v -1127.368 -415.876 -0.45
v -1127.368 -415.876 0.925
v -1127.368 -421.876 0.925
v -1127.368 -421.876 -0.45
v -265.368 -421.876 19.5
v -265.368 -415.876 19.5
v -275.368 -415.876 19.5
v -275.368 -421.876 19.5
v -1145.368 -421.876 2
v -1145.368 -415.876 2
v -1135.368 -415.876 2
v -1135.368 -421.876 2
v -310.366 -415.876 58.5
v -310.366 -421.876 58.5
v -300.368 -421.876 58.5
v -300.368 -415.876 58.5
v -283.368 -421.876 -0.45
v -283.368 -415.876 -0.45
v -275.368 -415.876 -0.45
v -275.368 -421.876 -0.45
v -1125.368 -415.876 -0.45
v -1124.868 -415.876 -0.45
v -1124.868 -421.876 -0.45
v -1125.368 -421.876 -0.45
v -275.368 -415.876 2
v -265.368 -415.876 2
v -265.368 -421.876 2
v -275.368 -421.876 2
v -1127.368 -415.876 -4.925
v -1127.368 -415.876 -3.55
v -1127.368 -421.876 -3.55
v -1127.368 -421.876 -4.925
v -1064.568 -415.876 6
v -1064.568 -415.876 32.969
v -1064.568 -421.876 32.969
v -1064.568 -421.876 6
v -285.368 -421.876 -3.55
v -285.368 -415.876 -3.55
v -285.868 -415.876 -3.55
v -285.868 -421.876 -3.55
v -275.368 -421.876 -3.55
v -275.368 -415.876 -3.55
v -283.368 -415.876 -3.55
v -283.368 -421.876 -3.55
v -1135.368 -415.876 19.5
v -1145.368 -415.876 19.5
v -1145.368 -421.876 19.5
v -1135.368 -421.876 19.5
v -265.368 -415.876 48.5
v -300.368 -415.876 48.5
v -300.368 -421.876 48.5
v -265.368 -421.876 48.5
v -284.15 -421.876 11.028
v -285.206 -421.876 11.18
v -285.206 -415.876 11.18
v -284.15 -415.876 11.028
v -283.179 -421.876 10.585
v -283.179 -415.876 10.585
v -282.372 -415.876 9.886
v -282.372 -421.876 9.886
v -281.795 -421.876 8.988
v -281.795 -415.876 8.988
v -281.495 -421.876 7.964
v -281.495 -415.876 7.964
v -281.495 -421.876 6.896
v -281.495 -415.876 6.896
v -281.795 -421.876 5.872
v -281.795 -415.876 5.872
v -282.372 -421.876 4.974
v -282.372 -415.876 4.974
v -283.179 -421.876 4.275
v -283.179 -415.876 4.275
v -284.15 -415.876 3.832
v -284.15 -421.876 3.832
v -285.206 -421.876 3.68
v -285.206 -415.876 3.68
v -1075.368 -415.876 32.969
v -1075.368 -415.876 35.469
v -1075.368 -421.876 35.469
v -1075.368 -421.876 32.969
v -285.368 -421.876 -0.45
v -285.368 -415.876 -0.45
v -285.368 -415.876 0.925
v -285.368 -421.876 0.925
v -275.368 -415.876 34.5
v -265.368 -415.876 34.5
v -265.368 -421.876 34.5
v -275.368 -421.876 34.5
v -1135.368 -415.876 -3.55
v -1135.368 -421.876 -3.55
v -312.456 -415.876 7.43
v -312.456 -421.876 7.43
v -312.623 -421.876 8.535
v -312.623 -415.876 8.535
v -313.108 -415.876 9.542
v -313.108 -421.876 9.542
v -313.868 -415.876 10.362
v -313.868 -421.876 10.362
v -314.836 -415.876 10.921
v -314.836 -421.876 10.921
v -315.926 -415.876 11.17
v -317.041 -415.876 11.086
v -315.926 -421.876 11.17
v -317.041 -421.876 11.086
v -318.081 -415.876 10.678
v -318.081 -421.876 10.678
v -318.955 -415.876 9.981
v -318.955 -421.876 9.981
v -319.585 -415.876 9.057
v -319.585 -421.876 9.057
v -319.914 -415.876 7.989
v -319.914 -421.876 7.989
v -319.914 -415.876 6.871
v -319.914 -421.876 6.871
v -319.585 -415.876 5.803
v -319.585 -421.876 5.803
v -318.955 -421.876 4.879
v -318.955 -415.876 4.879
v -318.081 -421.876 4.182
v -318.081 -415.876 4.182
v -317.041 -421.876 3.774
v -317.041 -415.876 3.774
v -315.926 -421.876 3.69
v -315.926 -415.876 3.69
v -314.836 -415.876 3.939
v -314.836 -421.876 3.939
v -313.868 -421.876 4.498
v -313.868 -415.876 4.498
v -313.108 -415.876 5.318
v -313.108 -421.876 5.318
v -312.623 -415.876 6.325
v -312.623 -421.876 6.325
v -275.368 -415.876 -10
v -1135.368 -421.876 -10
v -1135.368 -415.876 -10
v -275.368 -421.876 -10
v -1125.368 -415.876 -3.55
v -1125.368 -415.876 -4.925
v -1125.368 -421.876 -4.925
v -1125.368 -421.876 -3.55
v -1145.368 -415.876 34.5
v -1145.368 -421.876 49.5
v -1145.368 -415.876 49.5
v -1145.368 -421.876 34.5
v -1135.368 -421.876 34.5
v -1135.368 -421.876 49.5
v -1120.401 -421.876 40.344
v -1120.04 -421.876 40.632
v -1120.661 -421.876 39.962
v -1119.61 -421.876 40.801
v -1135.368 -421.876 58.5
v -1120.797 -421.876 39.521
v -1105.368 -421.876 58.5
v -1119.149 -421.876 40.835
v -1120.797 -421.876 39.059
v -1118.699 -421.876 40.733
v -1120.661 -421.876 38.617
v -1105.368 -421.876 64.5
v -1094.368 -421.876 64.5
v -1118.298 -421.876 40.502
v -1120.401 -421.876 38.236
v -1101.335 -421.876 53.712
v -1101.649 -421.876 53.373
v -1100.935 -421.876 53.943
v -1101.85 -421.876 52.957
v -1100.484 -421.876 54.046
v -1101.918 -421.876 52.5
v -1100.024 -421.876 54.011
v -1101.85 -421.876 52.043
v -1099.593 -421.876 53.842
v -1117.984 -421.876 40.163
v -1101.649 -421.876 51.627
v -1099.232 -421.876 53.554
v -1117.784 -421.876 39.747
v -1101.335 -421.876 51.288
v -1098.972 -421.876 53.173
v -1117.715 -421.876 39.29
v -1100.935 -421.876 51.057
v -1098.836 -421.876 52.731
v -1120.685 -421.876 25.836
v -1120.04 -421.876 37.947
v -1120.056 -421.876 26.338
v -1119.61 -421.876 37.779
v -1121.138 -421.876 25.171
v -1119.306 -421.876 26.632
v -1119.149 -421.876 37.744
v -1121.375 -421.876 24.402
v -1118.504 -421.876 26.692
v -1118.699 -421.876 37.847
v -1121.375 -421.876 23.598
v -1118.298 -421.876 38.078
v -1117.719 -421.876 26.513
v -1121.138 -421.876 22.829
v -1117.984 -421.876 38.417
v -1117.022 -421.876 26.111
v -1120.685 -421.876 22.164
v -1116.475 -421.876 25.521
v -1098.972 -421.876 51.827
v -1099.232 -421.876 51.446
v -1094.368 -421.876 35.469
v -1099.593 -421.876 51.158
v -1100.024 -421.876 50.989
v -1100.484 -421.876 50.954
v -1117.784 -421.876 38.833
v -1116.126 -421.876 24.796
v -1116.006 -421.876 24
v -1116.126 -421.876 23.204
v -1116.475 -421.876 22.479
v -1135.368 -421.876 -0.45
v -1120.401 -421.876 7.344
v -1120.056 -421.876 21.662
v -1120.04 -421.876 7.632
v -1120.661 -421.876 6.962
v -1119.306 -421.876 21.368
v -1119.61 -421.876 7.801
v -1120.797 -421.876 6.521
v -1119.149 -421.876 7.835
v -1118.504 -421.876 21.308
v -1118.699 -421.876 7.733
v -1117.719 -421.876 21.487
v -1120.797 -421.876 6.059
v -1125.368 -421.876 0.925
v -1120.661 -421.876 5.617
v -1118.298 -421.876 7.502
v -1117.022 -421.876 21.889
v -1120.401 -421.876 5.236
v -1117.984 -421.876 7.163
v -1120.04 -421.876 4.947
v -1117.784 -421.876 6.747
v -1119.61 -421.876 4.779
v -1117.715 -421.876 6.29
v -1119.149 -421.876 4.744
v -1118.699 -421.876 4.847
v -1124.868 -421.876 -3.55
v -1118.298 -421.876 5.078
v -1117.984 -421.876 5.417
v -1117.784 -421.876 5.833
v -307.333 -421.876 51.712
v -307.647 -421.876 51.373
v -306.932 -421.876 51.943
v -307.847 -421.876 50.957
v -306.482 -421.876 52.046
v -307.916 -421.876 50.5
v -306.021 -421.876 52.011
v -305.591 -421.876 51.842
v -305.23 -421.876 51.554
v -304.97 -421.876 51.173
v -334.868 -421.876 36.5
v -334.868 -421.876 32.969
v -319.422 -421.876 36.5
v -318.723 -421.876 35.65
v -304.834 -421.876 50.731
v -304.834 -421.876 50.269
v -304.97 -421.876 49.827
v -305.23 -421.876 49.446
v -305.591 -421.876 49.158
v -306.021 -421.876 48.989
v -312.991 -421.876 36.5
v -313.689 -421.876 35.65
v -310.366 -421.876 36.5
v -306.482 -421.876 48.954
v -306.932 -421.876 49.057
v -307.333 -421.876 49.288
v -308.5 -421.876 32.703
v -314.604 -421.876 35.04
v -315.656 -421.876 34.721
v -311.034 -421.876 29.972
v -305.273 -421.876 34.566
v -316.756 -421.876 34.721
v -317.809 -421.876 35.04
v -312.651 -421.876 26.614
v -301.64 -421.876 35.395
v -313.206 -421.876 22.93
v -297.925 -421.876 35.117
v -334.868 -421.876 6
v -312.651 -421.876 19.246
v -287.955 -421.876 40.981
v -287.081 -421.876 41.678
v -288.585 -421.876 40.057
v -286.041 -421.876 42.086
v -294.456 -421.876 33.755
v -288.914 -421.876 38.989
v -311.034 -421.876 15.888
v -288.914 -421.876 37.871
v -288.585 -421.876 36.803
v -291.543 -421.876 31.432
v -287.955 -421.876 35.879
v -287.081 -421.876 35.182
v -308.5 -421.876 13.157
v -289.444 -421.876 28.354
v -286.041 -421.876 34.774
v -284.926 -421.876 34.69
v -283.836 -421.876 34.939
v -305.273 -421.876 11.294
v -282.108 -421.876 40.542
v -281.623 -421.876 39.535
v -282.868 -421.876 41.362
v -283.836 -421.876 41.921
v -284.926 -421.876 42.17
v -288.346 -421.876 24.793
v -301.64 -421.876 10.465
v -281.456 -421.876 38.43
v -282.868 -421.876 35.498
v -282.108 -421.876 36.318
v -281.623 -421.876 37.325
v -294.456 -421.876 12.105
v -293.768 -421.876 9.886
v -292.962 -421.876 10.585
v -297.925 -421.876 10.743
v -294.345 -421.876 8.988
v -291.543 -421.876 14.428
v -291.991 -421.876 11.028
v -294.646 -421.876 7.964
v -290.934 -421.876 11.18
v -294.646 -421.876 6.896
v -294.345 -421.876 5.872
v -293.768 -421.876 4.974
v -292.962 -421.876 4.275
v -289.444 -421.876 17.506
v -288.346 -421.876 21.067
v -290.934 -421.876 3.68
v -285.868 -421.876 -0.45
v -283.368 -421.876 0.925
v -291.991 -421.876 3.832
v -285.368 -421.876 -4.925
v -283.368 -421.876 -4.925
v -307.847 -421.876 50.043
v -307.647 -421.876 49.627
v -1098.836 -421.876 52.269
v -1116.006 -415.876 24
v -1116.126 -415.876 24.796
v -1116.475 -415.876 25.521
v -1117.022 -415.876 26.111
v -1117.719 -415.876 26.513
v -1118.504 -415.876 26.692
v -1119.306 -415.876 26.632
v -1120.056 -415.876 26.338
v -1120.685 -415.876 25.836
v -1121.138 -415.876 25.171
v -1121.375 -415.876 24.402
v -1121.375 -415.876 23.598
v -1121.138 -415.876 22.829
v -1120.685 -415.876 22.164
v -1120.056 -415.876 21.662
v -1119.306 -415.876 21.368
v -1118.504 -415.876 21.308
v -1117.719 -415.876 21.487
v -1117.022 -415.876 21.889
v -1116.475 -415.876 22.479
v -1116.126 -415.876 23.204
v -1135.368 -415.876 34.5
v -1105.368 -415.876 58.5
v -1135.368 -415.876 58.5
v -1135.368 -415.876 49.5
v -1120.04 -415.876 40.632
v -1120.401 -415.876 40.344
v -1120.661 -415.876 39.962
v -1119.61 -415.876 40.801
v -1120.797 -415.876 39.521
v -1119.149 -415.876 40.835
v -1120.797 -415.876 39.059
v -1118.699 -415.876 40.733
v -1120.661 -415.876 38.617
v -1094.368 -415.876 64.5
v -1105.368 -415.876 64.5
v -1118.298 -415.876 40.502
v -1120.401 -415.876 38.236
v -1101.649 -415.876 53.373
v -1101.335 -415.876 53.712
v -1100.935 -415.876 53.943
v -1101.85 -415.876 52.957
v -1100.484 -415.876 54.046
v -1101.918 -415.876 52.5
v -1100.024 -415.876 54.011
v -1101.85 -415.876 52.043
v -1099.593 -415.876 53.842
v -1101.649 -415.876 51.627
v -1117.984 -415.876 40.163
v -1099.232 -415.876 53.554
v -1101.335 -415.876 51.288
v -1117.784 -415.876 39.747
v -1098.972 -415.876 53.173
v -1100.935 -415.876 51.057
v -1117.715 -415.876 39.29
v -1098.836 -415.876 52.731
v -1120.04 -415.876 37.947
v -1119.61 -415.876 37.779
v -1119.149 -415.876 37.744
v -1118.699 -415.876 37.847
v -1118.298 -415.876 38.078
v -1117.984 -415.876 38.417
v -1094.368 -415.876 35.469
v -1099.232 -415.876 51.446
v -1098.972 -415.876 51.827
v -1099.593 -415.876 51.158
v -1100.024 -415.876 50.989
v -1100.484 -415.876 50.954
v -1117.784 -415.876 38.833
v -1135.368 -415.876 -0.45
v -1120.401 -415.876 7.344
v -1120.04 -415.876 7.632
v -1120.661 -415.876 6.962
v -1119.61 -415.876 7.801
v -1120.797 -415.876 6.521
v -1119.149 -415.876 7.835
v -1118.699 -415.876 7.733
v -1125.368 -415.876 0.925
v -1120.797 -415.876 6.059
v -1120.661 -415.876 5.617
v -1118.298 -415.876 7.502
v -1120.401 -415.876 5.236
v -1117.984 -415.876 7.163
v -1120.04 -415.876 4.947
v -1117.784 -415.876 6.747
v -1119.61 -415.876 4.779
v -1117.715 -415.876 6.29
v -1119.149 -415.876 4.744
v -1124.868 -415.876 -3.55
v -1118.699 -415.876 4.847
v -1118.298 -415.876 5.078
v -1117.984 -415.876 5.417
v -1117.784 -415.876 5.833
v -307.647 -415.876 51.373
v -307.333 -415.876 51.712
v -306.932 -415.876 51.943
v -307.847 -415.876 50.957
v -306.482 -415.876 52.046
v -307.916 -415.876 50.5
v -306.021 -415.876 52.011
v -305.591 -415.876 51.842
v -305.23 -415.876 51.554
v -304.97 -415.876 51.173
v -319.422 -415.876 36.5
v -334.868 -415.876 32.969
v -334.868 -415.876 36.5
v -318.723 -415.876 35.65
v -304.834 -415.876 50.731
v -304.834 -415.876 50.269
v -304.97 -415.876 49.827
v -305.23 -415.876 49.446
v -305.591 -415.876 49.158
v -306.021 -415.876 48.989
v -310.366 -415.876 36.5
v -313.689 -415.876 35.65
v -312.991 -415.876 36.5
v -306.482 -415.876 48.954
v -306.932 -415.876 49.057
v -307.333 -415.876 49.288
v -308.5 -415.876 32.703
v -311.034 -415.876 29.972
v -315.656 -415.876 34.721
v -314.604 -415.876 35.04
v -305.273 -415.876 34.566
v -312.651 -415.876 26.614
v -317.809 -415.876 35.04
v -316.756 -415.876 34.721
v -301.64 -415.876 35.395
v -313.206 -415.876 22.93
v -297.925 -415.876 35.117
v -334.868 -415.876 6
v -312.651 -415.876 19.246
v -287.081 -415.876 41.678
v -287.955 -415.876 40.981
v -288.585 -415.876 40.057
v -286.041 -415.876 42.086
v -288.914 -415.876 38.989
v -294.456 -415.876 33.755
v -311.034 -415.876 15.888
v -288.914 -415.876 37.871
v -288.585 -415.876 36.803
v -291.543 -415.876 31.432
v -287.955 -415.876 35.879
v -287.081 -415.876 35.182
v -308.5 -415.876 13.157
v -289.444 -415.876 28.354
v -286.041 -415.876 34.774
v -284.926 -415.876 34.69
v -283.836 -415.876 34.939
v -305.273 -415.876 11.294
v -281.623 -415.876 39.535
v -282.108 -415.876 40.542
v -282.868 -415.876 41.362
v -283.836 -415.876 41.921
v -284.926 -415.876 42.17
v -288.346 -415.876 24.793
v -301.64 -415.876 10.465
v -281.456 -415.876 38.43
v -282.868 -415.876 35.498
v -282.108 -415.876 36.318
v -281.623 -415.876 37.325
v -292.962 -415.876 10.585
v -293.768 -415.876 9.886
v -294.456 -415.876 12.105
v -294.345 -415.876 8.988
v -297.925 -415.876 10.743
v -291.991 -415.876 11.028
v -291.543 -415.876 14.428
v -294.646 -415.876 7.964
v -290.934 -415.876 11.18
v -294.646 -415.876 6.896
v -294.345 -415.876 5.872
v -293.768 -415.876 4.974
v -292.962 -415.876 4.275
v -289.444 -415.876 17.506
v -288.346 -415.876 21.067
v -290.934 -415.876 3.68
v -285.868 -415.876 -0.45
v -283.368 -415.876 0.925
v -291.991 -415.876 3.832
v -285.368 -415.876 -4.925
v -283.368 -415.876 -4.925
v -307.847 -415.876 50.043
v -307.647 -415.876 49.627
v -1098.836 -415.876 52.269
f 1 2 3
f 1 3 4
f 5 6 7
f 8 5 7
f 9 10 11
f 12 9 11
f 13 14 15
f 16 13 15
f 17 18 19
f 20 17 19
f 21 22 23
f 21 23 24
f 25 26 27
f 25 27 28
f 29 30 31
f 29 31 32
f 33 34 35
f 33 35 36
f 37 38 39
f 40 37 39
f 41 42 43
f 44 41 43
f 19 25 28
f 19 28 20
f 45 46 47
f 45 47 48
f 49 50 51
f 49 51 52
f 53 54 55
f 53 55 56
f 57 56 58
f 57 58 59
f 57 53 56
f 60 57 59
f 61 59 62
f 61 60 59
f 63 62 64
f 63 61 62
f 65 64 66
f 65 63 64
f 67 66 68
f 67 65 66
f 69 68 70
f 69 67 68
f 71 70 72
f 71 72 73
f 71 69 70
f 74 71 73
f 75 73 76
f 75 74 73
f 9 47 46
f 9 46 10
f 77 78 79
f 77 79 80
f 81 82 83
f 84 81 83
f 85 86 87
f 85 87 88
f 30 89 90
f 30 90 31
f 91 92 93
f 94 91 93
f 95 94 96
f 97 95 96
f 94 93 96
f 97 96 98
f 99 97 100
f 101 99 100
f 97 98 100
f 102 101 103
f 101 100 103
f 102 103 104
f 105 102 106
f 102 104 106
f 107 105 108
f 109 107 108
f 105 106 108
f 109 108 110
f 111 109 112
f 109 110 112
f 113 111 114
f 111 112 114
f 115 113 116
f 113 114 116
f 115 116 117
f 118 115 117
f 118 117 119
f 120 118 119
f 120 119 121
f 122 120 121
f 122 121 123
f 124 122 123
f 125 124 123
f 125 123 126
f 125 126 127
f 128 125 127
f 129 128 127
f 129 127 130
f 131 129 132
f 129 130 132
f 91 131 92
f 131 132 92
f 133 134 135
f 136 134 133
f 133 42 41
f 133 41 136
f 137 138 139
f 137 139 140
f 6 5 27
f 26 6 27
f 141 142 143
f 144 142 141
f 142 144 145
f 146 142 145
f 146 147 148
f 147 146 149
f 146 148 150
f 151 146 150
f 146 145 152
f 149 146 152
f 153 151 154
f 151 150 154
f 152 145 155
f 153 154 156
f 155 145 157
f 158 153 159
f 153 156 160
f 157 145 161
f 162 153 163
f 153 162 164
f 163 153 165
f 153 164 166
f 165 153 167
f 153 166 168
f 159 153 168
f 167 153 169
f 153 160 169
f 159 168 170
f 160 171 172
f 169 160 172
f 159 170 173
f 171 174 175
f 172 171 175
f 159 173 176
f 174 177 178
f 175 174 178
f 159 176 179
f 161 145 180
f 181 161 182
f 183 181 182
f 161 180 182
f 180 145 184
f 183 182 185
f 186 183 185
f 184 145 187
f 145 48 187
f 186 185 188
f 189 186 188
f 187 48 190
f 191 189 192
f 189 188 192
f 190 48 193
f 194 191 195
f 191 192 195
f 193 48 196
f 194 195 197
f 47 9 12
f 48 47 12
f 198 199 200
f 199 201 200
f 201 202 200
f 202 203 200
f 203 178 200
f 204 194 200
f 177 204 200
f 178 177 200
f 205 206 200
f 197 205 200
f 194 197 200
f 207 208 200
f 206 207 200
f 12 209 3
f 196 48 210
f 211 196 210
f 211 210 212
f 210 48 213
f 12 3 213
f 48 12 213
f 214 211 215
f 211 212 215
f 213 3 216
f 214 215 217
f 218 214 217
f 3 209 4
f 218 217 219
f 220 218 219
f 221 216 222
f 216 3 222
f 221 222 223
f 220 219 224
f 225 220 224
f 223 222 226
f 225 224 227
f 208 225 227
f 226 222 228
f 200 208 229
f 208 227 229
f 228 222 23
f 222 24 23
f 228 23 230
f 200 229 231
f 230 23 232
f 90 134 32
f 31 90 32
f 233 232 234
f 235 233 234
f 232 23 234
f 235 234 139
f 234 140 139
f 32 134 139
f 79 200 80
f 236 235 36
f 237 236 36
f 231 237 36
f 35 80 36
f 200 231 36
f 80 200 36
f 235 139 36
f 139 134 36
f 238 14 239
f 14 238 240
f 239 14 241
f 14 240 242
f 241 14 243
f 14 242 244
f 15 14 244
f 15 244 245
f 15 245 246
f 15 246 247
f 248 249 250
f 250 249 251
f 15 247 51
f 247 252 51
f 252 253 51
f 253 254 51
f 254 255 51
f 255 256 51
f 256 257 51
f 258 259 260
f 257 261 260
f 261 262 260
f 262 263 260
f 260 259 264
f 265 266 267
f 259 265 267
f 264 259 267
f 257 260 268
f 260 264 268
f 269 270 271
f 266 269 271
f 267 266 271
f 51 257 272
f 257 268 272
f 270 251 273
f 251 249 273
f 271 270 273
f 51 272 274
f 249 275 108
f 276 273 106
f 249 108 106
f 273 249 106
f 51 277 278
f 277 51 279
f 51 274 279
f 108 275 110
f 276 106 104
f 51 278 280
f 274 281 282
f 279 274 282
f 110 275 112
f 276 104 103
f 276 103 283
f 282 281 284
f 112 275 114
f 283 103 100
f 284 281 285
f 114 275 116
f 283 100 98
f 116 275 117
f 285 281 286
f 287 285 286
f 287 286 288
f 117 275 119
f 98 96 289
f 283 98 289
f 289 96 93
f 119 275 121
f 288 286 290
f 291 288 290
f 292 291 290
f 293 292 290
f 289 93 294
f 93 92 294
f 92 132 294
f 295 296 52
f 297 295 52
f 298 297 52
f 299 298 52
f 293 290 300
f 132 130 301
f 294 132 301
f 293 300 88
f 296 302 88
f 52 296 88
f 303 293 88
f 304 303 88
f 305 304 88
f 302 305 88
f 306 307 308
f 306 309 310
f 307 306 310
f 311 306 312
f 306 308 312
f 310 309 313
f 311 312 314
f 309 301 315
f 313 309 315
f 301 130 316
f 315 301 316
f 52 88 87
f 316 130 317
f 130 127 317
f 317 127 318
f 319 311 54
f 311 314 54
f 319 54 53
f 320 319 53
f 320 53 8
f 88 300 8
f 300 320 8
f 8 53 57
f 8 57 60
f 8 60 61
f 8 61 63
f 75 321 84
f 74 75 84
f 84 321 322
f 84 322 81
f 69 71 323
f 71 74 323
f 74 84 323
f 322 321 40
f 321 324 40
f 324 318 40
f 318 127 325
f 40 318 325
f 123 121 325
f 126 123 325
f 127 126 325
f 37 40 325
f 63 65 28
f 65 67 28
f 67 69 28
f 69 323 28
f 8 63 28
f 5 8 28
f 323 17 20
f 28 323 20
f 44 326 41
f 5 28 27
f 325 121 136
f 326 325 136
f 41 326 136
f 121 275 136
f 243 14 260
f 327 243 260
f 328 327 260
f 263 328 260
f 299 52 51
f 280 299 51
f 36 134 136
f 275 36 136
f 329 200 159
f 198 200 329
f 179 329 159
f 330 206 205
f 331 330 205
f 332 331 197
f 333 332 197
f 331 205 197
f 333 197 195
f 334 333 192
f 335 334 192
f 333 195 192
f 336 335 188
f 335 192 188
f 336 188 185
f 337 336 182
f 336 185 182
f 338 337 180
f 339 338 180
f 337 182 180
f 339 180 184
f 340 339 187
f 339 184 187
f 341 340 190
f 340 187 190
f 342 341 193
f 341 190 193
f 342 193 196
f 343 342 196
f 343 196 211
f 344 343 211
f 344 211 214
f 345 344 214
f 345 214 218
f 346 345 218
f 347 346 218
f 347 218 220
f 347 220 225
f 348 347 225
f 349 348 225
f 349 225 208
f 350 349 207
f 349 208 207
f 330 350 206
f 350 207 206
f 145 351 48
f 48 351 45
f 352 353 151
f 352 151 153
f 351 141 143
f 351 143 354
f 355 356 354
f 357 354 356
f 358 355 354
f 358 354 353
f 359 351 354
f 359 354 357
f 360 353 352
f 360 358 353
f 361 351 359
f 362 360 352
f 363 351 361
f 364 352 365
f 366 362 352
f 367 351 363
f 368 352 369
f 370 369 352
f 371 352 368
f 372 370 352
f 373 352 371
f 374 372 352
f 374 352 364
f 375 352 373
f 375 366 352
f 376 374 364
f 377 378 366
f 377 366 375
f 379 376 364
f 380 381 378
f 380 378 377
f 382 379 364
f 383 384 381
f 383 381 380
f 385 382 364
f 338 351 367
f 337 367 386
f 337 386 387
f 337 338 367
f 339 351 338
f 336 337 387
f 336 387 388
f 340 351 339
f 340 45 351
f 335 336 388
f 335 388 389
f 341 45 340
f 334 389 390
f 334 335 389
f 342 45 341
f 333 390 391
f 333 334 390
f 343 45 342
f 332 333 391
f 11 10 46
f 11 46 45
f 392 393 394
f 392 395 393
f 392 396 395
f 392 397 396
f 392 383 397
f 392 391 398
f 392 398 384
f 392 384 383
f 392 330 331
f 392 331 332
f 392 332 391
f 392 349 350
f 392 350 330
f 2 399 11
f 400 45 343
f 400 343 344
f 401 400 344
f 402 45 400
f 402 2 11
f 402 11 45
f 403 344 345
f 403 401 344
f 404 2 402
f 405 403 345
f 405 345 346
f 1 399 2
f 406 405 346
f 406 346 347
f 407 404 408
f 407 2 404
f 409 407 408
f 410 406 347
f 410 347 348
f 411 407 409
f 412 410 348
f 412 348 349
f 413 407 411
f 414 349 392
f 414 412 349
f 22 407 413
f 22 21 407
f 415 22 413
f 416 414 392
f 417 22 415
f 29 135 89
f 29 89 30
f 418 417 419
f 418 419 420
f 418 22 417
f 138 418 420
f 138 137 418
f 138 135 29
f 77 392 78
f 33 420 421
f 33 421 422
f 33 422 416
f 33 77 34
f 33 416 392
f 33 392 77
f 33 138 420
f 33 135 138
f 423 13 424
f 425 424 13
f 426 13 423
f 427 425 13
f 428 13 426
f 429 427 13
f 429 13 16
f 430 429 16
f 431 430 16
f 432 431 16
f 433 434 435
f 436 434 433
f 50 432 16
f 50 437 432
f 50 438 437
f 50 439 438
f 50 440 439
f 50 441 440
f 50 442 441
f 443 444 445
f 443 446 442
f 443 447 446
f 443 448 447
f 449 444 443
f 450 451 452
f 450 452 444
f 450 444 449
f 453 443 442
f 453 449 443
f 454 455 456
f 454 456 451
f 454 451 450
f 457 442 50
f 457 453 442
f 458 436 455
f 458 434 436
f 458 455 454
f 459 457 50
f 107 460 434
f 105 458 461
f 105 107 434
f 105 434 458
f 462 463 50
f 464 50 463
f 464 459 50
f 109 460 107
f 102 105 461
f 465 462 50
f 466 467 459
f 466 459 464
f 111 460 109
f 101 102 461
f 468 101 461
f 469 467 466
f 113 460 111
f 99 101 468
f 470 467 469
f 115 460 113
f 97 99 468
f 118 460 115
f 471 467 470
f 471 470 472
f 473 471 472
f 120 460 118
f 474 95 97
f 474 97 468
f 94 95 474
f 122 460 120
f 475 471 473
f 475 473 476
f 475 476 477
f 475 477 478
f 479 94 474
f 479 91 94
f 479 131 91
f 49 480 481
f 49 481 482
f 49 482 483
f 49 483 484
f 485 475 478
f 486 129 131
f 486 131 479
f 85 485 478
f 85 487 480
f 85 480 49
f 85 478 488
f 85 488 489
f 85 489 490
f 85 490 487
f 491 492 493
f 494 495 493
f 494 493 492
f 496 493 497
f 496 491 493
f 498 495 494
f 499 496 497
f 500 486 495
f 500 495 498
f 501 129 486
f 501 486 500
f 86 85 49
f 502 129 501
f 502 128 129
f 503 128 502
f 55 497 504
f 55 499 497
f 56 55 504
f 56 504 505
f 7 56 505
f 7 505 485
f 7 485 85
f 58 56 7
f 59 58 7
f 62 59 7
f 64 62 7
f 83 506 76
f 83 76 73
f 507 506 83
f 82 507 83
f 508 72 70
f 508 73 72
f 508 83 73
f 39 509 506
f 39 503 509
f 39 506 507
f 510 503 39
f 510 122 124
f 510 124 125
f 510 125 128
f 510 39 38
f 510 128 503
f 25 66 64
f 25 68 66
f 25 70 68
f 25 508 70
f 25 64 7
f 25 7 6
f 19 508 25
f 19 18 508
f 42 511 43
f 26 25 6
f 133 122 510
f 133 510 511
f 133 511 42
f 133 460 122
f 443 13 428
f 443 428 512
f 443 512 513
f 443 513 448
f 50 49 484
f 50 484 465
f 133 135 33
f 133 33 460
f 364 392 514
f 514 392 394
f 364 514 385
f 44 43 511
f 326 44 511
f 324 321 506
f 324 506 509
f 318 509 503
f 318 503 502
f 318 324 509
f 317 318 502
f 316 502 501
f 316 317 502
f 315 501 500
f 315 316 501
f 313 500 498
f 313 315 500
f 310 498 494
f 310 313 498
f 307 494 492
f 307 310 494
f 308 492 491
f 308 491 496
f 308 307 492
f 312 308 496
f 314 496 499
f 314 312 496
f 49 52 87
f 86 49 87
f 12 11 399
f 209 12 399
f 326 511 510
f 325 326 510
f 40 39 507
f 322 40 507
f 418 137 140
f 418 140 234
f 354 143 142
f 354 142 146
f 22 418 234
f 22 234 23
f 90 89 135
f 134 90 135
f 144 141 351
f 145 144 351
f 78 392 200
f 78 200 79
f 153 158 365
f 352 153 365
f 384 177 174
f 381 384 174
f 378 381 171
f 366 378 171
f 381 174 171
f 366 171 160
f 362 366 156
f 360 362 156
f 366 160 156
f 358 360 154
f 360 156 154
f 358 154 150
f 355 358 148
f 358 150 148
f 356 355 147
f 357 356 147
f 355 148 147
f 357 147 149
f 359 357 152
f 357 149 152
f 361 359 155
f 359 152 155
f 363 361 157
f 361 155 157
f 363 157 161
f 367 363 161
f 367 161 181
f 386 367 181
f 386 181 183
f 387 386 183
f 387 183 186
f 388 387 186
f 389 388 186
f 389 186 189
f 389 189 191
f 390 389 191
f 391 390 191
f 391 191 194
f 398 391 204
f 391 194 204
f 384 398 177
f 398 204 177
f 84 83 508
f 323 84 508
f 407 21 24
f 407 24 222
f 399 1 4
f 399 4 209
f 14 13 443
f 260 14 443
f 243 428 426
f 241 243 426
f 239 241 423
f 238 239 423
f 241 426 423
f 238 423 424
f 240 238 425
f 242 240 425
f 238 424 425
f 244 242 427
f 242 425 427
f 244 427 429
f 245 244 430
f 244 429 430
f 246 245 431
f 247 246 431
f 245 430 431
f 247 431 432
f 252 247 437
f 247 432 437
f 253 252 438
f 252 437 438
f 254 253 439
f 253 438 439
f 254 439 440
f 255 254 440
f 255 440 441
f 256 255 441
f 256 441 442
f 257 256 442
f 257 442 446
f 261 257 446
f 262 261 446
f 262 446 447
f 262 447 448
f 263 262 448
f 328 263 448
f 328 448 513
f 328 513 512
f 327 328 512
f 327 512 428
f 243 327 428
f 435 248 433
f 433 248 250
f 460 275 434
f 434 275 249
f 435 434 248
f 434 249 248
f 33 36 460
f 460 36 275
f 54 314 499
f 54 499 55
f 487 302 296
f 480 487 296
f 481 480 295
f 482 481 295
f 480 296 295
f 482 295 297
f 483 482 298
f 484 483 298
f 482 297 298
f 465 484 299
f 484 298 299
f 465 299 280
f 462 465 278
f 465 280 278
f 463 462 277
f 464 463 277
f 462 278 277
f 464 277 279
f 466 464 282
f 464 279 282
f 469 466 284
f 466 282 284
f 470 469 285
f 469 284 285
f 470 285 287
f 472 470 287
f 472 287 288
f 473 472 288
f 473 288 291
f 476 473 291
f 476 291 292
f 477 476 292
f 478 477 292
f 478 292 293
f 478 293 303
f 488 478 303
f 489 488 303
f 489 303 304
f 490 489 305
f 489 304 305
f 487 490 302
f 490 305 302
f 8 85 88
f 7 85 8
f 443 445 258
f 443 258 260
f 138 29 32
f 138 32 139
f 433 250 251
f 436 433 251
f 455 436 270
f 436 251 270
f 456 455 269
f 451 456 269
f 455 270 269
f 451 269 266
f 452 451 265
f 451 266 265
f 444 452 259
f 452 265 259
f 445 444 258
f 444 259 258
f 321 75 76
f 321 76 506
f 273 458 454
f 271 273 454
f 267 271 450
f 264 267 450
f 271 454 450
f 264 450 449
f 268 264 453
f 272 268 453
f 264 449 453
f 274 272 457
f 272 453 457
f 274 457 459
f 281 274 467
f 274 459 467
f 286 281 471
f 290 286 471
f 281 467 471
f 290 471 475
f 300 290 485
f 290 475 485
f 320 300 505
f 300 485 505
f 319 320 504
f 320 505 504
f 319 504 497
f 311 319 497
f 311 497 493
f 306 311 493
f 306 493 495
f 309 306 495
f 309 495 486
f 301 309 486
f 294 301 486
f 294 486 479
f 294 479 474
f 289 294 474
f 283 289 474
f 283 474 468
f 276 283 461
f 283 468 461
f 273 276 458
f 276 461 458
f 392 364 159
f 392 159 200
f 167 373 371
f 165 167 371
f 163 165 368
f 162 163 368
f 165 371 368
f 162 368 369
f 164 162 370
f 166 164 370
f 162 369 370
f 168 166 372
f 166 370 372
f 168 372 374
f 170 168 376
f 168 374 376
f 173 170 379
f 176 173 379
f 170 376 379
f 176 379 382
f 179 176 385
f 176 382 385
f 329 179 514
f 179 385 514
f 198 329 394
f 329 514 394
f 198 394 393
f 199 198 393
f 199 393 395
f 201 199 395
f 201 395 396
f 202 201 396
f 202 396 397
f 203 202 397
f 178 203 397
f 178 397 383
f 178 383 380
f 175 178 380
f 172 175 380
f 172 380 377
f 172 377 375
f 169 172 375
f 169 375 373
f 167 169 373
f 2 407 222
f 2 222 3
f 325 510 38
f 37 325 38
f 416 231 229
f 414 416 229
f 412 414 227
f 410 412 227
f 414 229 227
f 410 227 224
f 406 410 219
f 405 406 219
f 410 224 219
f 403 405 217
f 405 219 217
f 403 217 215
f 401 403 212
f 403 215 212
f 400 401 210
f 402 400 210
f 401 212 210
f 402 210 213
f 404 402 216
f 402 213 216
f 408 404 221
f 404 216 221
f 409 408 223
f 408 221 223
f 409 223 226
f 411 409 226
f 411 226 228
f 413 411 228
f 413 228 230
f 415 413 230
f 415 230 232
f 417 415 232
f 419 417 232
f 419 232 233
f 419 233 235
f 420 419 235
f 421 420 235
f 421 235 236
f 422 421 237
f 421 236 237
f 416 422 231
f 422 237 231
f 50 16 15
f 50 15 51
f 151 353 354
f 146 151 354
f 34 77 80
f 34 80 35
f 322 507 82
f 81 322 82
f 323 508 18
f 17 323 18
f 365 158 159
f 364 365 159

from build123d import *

# Parameters (mm, degrees)
DODANIE_WYCI_GNI_CIE2_DEPTH      = 3
DODANIE_WYCI_GNI_CIE2_DEPTH_BACK = 3
SZKIC1_W                         = 880
SZKIC1_H                         = 74.5
SZKIC1_W_2                       = 736
SZKIC1_H_2                       = 28
SZKIC2_W                         = 40
SZKIC2_H                         = 6
WYTNIJ_WYCI_GNI_CIE1_DEPTH       = 6
SZYK_LINIOWY1_COUNT              = 13
SZYK_LINIOWY1_PITCH              = 91
WYTNIJ_WYCI_GNI_CIE2_DEPTH       = 6
SZKIC4_W                         = 10
SZKIC4_H                         = 15
SZKIC4_H_2                       = 9
SZKIC4_H_3                       = 12
WYTNIJ_WYCI_GNI_CIE3_DEPTH       = 6
WYTNIJ_WYCI_GNI_CIE4_DEPTH       = 6
SZKIC8_R                         = 1.55
SZKIC8_R_2                       = 2.7
WYTNIJ_WYCI_GNI_CIE5_DEPTH       = 6
SZKIC9_R                         = 12.5
WYTNIJ_WYCI_GNI_CIE6_DEPTH       = 6
SZKIC13_W                        = 30
SZKIC13_H                        = 16
WYTNIJ_WYCI_GNI_CIE8_DEPTH       = 6
SZYK_LINIOWY3_COUNT              = 2
SZYK_LINIOWY3_PITCH              = 91
SZYK_LINIOWY3_COUNT_DIR2         = 3
SZYK_LINIOWY3_PITCH_DIR2         = 273
SZKIC15_W                        = 765.002168891
SZKIC15_H                        = 31.530782264
WYTNIJ_WYCI_GNI_CIE9_DEPTH       = 10
SZKIC16_R                        = 1.55
WYTNIJ_WYCI_GNI_CIE10_DEPTH      = 10
SZKIC17_W                        = 24
SZKIC17_H                        = 29.031184719
WYTNIJ_WYCI_GNI_CIE11_DEPTH      = 6
SZKIC20_W                        = 5
SZKIC20_H                        = 10
DODANIE_WYCI_GNI_CIE3_DEPTH      = 6
SZKIC18_W                        = 24.502253475
SZKIC18_H                        = 3.530782264
DODANIE_WYCI_GNI_CIE4_DEPTH      = 6
SZKIC21_W                        = 6.3
SZKIC21_H                        = 26.969217736
DODANIE_WYCI_GNI_CIE5_DEPTH      = 6
SZKIC22_W                        = 10
SZKIC22_H                        = 10
WYTNIJ_WYCI_GNI_CIE12_DEPTH      = 10
SZKIC11_R                        = 3.75
WYTNIJ_WYCI_GNI_CIE7_DEPTH       = 6


with BuildPart() as part:
    # Szkic1 → Dodanie-wyciągnięcie2 (new, two sides: drawn at the far end of the back side and taken through both)
    with BuildSketch(Plane(origin=(0, -418.87633849, -418.87633849), x_dir=(1, 0, 0), z_dir=(0, 1, 0)).offset(-DODANIE_WYCI_GNI_CIE2_DEPTH_BACK)):
        with Locations((-705.368459045, -446.12633849)):
            Rectangle(SZKIC1_W, SZKIC1_H)
        with Locations((-702.868459045, -438.87633849)):
            Rectangle(SZKIC1_W_2, SZKIC1_H_2, mode=Mode.SUBTRACT)
    extrude(amount=DODANIE_WYCI_GNI_CIE2_DEPTH + DODANIE_WYCI_GNI_CIE2_DEPTH_BACK)

    # Szkic2 → Wytnij-wyciągnięcie1 (cut)
    with BuildSketch(Plane.XY.offset(64.5)):
        with Locations((-1125.368459045, -418.87633849)):
            Rectangle(SZKIC2_W, SZKIC2_H)
    wytnij_wyci_gni_cie1 = extrude(amount=-WYTNIJ_WYCI_GNI_CIE1_DEPTH, mode=Mode.SUBTRACT)

    # Szyk liniowy1: Wytnij-wyciągnięcie1 ×13
    with Locations(*[(i * SZYK_LINIOWY1_PITCH, 0, 0) for i in range(1, SZYK_LINIOWY1_COUNT)]):
        add(wytnij_wyci_gni_cie1, mode=Mode.SUBTRACT)

    # Szkic3 → Wytnij-wyciągnięcie2 (cut)
    with BuildSketch(Plane(origin=(0, -415.87633849, 0), x_dir=(1, 0, 0), z_dir=(0, 1, 0))):
        Polygon((-1032.818459045, -58.5), (-1035.918459045, -58.5), (-1035.918459045, -54.5), (-1037.293459045, -54.5), (-1037.293459045, -52.5), (-1035.918459045, -52.5), (-1035.918459045, -52), (-1032.818459045, -52), (-1032.818459045, -52.5), (-1031.443459045, -52.5), (-1031.443459045, -54.5), (-1032.818459045, -54.5), align=None)
    wytnij_wyci_gni_cie2 = extrude(amount=-WYTNIJ_WYCI_GNI_CIE2_DEPTH, mode=Mode.SUBTRACT)

    # Szkic4 → Wytnij-wyciągnięcie3 (cut)
    with BuildSketch(Plane(origin=(0, -415.87633849, 0), x_dir=(1, 0, 0), z_dir=(0, 1, 0))):
        with Locations((-1140.368459045, -27)):
            Rectangle(SZKIC4_W, SZKIC4_H)
        with Locations((-1140.368459045, -54)):
            Rectangle(SZKIC4_W, SZKIC4_H_2)
        with Locations((-1140.368459045, 4)):
            Rectangle(SZKIC4_W, SZKIC4_H_3)
    wytnij_wyci_gni_cie3 = extrude(amount=-WYTNIJ_WYCI_GNI_CIE3_DEPTH, mode=Mode.SUBTRACT)

    # Szkic5 → Wytnij-wyciągnięcie4 (cut)
    with BuildSketch(Plane(origin=(0, -415.87633849, 0), x_dir=(1, 0, 0), z_dir=(0, 1, 0))):
        Polygon((-1135.368459045, 3.55), (-1127.368459045, 3.55), (-1127.368459045, 4.925), (-1125.368459045, 4.925), (-1125.368459045, 3.55), (-1124.868459045, 3.55), (-1124.868459045, 0.45), (-1125.368459045, 0.45), (-1125.368459045, -0.925), (-1127.368459045, -0.925), (-1127.368459045, 0.45), (-1135.368459045, 0.45), align=None)
    wytnij_wyci_gni_cie4 = extrude(amount=-WYTNIJ_WYCI_GNI_CIE4_DEPTH, mode=Mode.SUBTRACT)

    # Lustro1: Wytnij-wyciągnięcie3, Wytnij-wyciągnięcie4 across plane
    add(wytnij_wyci_gni_cie3.mirror(Plane.ZY.offset(705.368459045)), mode=Mode.SUBTRACT)
    add(wytnij_wyci_gni_cie4.mirror(Plane.ZY.offset(705.368459045)), mode=Mode.SUBTRACT)

    # Szkic8 → Wytnij-wyciągnięcie5 (cut)
    with BuildSketch(Plane.XZ.offset(421.87633849)):
        with Locations((-1119.26479978, 39.289778966)):
            Circle(SZKIC8_R)
        with Locations((-1119.26479978, 6.289778966)):
            Circle(SZKIC8_R)
        with Locations((-1118.705640448, 24)):
            Circle(SZKIC8_R_2)
    extrude(amount=-WYTNIJ_WYCI_GNI_CIE5_DEPTH, mode=Mode.SUBTRACT)

    # Szkic9 → Wytnij-wyciągnięcie6 (cut)
    with BuildSketch(Plane(origin=(0, -415.87633849, 0), x_dir=(1, 0, 0), z_dir=(0, 1, 0))):
        with Locations((-300.706340265, -22.93)):
            Circle(SZKIC9_R)
    extrude(amount=-WYTNIJ_WYCI_GNI_CIE6_DEPTH, mode=Mode.SUBTRACT)

    # Szkic13 → Wytnij-wyciągnięcie8 (cut)
    with BuildSketch(Plane(origin=(0, -415.87633849, 0), x_dir=(1, 0, 0), z_dir=(0, 1, 0))):
        with Locations((-280.368459045, -56.5)):
            Rectangle(SZKIC13_W, SZKIC13_H)
    extrude(amount=-WYTNIJ_WYCI_GNI_CIE8_DEPTH, mode=Mode.SUBTRACT)

    # Szyk liniowy3: Wytnij-wyci_gni_cie2 2 × 3
    with Locations(*[Vector(1, 0, 0) * (i * SZYK_LINIOWY3_PITCH) + Vector(1, 0, 0) * (j * SZYK_LINIOWY3_PITCH_DIR2) for i in range(SZYK_LINIOWY3_COUNT) for j in range(SZYK_LINIOWY3_COUNT_DIR2) if (i, j) != (0, 0)]):
        add(wytnij_wyci_gni_cie2, mode=Mode.SUBTRACT)

    # Szkic15 → Wytnij-wyciągnięcie9 (cut)
    with BuildSketch(Plane(origin=(0, -415.87633849, 0), x_dir=(1, 0, 0), z_dir=(0, 1, 0))):
        with Locations((-692.867290015, -48.734608868)):
            Rectangle(SZKIC15_W, SZKIC15_H)
    extrude(amount=-WYTNIJ_WYCI_GNI_CIE9_DEPTH, mode=Mode.SUBTRACT)

    # Szkic16 → Wytnij-wyciągnięcie10 (cut)
    with BuildSketch(Plane(origin=(0, -415.87633849, 0), x_dir=(1, 0, 0), z_dir=(0, 1, 0))):
        with Locations((-306.36620557, -50.5)):
            Circle(SZKIC16_R)
        with Locations((-1100.368459045, -52.5)):
            Circle(SZKIC16_R)
    extrude(amount=-WYTNIJ_WYCI_GNI_CIE10_DEPTH, mode=Mode.SUBTRACT)

    # Szkic17 → Wytnij-wyciągnięcie11 (cut)
    with BuildSketch(Plane(origin=(0, -415.87633849, 0), x_dir=(1, 0, 0), z_dir=(0, 1, 0))):
        with Locations((-1082.368459045, -49.984407641)):
            Rectangle(SZKIC17_W, SZKIC17_H)
    extrude(amount=-WYTNIJ_WYCI_GNI_CIE11_DEPTH, mode=Mode.SUBTRACT)

    # Szkic20 → Dodanie-wyciągnięcie3 (add)
    with BuildSketch(Plane.XZ.offset(421.87633849)):
        with Locations((-292.868459045, 53.5)):
            Rectangle(SZKIC20_W, SZKIC20_H)
    extrude(amount=-DODANIE_WYCI_GNI_CIE3_DEPTH)

    # Szkic18 → Dodanie-wyciągnięcie4 (add)
    with BuildSketch(Plane.XZ.offset(421.87633849)):
        with Locations((-322.617332308, 34.734608868)):
            Rectangle(SZKIC18_W, SZKIC18_H)
    extrude(amount=-DODANIE_WYCI_GNI_CIE4_DEPTH)

    # Szkic21 → Dodanie-wyciągnięcie5 (add)
    with BuildSketch(Plane(origin=(0, -415.87633849, 0), x_dir=(1, 0, 0), z_dir=(0, 1, 0))):
        with Locations((-1067.718459045, -19.484608868)):
            Rectangle(SZKIC21_W, SZKIC21_H)
    extrude(amount=-DODANIE_WYCI_GNI_CIE5_DEPTH)

    # Szkic22 → Wytnij-wyciągnięcie12 (cut)
    with BuildSketch(Plane(origin=(0, -415.87633849, 0), x_dir=(1, 0, 0), z_dir=(0, 1, 0))):
        with Locations((-295.368459045, -53.5)):
            Rectangle(SZKIC22_W, SZKIC22_H)
    extrude(amount=-WYTNIJ_WYCI_GNI_CIE12_DEPTH, mode=Mode.SUBTRACT)

    # Szkic11 → Wytnij-wyciągnięcie7 (cut)
    with BuildSketch(Plane.XZ.offset(421.87633849)):
        with Locations((-285.206340265, 38.43)):
            Circle(SZKIC11_R)
        with Locations((-316.206340265, 38.43)):
            Circle(SZKIC11_R)
        with Locations((-316.206340265, 7.43)):
            Circle(SZKIC11_R)
        with BuildLine():
            Line((-285.206340265, 3.68), (-290.934328079, 3.68))
            ThreePointArc((-290.934328079, 3.68), (-294.684328079, 7.43), (-290.934328079, 11.18))
            Line((-290.934328079, 11.18), (-285.206340265, 11.18))
            ThreePointArc((-285.206340265, 11.18), (-281.456340265, 7.43), (-285.206340265, 3.68))
        make_face()
    extrude(amount=-WYTNIJ_WYCI_GNI_CIE7_DEPTH, mode=Mode.SUBTRACT)


solid = part.part
